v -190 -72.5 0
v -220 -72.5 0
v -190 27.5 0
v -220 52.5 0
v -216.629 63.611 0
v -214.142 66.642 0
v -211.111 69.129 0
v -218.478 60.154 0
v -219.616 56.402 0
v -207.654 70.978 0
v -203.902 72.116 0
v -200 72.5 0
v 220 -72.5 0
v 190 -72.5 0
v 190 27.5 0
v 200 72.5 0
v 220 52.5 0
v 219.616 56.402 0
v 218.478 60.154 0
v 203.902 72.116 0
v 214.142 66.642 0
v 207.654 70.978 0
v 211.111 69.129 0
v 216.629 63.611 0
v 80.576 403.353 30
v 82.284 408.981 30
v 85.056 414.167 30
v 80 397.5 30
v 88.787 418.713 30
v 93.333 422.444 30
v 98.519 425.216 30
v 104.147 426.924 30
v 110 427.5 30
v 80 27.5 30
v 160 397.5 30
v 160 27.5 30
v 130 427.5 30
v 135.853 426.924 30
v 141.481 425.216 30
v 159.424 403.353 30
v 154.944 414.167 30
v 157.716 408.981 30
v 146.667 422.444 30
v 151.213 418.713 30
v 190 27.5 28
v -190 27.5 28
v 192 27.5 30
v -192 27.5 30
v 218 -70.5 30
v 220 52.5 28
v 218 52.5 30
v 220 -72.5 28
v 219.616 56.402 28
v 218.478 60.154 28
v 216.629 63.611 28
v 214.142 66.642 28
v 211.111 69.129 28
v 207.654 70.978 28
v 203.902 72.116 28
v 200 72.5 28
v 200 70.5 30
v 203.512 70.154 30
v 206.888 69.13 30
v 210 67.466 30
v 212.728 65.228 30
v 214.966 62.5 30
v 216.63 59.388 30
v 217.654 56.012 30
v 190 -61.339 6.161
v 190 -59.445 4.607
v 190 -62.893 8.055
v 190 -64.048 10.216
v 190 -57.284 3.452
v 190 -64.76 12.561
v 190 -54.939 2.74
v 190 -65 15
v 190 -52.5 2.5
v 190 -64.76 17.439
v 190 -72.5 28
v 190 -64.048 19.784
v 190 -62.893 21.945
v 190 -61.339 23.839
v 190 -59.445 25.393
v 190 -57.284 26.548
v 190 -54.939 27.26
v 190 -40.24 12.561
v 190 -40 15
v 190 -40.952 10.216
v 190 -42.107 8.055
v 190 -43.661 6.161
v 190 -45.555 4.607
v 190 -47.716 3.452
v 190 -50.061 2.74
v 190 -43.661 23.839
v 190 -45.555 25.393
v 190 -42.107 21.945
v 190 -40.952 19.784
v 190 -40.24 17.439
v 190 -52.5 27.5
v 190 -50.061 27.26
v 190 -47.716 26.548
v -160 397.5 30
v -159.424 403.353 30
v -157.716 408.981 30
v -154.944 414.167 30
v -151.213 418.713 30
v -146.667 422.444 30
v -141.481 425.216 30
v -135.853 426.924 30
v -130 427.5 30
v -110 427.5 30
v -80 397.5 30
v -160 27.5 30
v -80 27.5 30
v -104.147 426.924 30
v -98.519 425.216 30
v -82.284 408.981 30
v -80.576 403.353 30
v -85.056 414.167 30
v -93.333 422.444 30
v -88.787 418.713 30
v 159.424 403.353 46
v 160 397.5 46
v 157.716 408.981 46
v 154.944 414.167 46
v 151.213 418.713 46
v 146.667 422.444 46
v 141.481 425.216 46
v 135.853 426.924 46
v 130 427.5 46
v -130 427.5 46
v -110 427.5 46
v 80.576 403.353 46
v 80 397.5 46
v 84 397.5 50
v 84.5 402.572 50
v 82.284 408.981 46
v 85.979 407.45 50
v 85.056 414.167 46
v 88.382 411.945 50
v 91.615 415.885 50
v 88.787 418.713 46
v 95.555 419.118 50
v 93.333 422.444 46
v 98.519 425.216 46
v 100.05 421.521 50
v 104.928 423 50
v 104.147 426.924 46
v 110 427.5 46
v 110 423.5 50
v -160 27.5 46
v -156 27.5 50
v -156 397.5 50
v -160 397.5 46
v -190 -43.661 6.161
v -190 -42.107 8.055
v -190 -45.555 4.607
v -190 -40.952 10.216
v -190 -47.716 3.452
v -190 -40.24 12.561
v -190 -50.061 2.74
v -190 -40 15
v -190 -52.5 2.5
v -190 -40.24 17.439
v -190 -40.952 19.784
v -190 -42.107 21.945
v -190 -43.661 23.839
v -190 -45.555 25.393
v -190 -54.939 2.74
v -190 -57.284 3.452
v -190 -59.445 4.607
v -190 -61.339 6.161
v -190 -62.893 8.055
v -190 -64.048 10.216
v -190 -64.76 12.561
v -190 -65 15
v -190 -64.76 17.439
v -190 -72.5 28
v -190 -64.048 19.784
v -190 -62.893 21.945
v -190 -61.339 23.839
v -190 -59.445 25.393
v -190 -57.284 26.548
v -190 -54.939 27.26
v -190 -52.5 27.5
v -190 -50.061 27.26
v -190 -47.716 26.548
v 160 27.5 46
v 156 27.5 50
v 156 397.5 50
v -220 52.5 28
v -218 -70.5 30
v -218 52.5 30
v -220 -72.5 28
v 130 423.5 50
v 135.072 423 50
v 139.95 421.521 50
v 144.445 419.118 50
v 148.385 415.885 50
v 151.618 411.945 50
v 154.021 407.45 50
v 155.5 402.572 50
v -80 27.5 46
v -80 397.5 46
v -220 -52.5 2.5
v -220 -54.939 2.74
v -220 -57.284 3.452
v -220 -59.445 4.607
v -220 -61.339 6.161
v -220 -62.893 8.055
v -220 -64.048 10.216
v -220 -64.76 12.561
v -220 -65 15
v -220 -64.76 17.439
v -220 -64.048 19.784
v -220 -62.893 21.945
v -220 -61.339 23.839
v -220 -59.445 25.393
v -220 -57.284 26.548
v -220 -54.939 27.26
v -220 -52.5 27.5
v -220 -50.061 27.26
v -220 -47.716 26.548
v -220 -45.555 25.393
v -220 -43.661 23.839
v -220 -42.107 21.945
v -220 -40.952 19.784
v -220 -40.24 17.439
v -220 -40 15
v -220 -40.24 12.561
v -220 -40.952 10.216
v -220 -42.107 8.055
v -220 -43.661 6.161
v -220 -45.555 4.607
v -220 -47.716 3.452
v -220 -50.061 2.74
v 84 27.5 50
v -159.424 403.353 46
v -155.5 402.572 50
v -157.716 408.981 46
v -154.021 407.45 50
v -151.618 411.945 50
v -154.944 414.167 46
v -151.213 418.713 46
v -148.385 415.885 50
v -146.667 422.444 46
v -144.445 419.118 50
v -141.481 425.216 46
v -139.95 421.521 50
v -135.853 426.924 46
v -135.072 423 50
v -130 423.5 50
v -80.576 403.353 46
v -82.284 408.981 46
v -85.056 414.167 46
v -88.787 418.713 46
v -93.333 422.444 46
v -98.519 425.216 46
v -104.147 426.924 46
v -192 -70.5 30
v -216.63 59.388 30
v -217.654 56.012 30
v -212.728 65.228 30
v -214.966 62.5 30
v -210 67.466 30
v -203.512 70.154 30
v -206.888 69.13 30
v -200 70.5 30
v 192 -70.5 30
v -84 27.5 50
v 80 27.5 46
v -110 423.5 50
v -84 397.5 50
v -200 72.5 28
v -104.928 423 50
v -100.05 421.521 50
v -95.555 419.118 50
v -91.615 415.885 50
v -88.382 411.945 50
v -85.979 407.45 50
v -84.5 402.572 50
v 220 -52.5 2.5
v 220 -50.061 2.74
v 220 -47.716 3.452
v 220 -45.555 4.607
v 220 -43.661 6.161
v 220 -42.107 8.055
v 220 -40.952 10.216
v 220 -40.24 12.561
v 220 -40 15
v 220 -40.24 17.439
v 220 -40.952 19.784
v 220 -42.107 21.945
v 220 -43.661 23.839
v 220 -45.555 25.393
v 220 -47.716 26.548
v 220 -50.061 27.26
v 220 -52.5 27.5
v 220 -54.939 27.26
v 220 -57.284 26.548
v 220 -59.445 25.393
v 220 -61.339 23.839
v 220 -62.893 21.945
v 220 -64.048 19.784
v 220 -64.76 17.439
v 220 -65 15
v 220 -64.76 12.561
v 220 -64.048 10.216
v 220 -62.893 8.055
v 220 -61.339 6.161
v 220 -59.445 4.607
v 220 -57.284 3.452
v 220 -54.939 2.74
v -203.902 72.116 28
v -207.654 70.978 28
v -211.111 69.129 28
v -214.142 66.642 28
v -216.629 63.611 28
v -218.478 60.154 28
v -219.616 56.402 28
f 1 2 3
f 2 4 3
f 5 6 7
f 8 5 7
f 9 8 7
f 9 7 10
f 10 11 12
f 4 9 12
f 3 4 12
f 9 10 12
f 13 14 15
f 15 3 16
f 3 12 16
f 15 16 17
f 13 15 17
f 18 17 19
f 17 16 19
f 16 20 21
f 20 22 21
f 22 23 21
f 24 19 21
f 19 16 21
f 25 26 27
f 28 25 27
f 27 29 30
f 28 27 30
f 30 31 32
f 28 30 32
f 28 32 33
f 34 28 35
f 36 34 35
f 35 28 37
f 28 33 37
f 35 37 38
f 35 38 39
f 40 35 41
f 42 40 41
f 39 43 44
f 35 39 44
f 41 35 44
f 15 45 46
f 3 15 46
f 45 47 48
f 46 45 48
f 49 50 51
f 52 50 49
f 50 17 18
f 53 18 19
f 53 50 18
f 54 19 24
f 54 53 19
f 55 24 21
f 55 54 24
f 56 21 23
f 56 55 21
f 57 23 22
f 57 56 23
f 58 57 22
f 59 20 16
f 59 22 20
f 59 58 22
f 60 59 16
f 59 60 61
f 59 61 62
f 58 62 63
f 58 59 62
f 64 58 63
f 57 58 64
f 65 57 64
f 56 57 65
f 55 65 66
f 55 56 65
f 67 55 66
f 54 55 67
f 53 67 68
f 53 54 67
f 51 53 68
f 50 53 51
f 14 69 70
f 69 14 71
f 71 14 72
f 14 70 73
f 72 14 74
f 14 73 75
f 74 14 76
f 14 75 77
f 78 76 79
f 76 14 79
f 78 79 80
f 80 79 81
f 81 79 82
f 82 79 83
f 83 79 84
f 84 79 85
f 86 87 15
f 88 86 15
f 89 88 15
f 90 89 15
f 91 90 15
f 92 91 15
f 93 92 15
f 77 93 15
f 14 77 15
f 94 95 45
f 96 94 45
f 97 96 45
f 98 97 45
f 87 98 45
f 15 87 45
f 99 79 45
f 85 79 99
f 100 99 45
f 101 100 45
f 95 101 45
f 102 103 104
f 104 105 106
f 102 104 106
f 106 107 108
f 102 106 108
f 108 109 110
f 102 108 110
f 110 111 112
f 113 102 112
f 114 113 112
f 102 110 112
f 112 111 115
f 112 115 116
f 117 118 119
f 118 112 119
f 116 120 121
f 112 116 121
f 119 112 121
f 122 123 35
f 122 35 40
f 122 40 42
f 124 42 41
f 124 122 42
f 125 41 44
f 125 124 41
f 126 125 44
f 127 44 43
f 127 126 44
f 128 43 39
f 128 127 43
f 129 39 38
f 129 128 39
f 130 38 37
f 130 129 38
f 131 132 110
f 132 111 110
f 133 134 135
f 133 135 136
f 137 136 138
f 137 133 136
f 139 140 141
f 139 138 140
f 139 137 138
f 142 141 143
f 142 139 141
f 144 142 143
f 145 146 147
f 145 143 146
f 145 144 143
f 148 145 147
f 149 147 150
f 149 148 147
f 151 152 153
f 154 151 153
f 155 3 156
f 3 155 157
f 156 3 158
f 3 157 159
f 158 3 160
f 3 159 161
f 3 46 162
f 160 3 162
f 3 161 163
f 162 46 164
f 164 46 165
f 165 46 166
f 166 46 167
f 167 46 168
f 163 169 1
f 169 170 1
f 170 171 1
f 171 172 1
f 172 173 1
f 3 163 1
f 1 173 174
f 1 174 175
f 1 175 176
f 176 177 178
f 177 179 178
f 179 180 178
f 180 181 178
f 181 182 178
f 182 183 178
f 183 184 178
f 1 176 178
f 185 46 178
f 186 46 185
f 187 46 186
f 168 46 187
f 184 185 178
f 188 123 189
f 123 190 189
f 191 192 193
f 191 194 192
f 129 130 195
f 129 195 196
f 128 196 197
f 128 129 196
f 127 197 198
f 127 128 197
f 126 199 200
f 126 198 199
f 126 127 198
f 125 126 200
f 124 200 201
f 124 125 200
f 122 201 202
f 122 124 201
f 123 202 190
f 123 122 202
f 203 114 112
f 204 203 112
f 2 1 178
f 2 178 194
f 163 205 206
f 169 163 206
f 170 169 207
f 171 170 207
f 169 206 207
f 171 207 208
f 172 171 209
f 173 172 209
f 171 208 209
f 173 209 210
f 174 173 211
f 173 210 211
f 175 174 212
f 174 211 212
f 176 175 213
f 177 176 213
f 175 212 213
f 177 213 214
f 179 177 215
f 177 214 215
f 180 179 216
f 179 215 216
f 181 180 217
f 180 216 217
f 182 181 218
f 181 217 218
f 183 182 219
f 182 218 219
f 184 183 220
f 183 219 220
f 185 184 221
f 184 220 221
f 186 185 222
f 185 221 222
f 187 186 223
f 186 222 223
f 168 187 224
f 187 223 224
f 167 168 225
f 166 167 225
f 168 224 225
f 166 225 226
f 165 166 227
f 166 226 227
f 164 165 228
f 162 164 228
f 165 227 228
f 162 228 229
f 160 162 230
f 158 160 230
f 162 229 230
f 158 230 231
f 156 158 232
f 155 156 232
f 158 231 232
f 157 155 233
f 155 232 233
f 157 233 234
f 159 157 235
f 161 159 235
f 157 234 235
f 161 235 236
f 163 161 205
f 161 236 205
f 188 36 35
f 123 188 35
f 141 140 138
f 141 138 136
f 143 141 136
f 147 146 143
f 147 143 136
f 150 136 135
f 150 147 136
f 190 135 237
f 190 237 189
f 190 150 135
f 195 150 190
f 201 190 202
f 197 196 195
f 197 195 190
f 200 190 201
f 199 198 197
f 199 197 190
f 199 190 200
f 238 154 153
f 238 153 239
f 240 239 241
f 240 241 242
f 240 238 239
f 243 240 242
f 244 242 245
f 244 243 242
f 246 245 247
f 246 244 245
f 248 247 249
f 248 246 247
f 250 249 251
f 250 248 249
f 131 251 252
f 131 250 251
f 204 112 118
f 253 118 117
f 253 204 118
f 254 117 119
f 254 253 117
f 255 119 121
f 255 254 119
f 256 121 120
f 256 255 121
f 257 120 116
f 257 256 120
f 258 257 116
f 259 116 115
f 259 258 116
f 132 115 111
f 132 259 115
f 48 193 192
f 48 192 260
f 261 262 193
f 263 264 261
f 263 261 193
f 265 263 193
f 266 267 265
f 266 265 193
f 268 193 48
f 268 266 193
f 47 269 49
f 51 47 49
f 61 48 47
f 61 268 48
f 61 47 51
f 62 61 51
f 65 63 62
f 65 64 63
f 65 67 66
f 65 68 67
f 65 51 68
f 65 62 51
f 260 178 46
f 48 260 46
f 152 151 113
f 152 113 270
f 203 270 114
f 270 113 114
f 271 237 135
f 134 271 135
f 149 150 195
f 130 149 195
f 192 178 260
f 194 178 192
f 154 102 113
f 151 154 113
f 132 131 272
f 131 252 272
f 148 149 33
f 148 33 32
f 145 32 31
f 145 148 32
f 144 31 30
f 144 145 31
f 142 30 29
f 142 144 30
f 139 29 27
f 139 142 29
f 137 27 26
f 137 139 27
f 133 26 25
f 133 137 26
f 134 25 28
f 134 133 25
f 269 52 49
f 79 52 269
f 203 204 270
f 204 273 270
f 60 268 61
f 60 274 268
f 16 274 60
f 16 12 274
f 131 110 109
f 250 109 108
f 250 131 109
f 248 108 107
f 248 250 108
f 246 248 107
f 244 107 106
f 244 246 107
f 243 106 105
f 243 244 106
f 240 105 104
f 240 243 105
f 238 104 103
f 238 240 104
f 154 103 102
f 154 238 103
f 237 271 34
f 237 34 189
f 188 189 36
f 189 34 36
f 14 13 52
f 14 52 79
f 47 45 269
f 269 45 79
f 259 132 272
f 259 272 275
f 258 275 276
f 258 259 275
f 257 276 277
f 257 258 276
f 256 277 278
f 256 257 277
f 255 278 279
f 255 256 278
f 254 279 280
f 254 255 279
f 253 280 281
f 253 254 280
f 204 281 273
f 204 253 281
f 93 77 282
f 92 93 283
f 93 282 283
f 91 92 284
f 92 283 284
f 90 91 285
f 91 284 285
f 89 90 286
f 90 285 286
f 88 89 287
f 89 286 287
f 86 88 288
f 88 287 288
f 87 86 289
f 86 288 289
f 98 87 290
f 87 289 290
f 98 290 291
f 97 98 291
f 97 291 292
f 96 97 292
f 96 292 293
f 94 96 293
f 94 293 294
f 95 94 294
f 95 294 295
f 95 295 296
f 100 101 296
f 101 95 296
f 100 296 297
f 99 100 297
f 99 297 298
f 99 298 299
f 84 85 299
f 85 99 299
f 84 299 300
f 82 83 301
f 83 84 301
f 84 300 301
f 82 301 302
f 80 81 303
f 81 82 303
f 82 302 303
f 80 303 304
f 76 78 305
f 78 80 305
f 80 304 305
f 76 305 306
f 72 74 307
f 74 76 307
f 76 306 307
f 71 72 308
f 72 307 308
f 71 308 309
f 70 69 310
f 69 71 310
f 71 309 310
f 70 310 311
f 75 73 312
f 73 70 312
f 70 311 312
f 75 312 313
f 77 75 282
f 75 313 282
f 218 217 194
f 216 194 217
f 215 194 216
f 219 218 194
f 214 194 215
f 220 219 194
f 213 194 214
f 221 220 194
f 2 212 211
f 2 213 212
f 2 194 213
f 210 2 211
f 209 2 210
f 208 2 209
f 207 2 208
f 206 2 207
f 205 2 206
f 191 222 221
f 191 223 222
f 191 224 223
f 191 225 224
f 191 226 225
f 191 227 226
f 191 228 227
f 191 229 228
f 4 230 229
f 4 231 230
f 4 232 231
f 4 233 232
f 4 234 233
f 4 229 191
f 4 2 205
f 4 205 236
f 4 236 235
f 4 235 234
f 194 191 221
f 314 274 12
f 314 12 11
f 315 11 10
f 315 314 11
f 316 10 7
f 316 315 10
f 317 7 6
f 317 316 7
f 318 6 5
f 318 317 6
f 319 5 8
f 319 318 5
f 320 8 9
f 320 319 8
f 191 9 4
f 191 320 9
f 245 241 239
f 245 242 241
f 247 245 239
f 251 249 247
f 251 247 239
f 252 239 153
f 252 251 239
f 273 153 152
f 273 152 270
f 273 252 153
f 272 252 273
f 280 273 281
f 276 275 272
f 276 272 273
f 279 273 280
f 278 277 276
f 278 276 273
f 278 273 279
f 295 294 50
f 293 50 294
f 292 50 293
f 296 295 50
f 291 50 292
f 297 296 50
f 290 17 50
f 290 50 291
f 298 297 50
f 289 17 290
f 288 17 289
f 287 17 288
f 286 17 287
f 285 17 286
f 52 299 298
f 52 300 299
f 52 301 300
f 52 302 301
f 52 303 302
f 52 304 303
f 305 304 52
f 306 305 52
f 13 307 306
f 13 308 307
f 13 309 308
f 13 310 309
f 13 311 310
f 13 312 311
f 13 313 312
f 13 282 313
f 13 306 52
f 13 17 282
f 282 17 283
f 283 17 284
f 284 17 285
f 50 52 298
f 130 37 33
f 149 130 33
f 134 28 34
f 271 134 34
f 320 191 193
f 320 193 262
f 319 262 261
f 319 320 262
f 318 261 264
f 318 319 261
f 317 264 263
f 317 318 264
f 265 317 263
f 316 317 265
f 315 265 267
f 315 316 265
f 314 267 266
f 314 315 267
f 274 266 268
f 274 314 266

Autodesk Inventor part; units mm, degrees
ref_plane "YZ Plane" through (0, 0, 0) normal (1, 0, 0) x (0, 1, 0)
ref_plane "XZ Plane" through (0, 0, 0) normal (0, 1, 0) x (-1, 0, 0)
ref_plane "XY Plane" through (0, 0, 0) normal (0, 0, 1) x (1, 0, 0)
sketch "Sketch1" plane through (0, 0, 0) normal (0, 0, 1) x (1, 0, 0)
  line L0 (-220, 72.5) -> (220, 72.5)
  line L1 (220, 72.5) -> (220, -72.5)
  line L2 (220, -72.5) -> (-220, -72.5)
  line L3 (-220, -72.5) -> (-220, 72.5)
  line L4 (-220, 72.5) -> (220, -72.5) construction
  line L5 (220, 72.5) -> (-220, -72.5) construction
  point P0 (0, 0)
  dimension "d0" = 440
  dimension "d1" = 145
extrude "Extrusion1" add sketch "Sketch1" along normal blind 30
sketch "Sketch2" plane through (0, 0, 30) normal (0, 0, 1) x (1, 0, 0)
  line L0 (-220, -72.5) -> (220, -72.5) projected
  line L1 (-190, -72.5) -> (190, -72.5)
  line L2 (190, -72.5) -> (190, 27.5)
  line L3 (190, 27.5) -> (-190, 27.5)
  line L4 (-190, 27.5) -> (-190, -72.5)
  line L5 (220, -72.5) -> (220, 72.5) projected
  line L6 (0, 72.5) -> (0, -72.5) construction
  line L7 (220, 72.5) -> (-220, 72.5) construction
  point P0 (0, 0)
  dimension "d4" = 30
  dimension "d5" = 45
extrude "Extrusion2" cut sketch "Sketch2" against normal blind 30
fillet "Fillet1" radius 20 2 edges at (220, 72.5, 15) (-220, 72.5, 15)
sketch "Sketch3" plane through (0, 0, 30) normal (0, 0, 1) x (1, 0, 0)
  line L0 (-190, 27.5) -> (190, 27.5) projected
  line L1 (-160, 27.5) -> (-80, 27.5)
  line L2 (-80, 27.5) -> (-80, 427.5)
  line L3 (-80, 427.5) -> (-160, 427.5)
  line L4 (-160, 427.5) -> (-160, 27.5)
  line L5 (-220, 52.5) -> (-220, -72.5) projected
  line L6 (-220, -72.5) -> (-190, -72.5) projected
  point P0 (0, 0)
  point P1 (-205, -72.5)
  dimension "d9" = 60
  dimension "d10" = 80
  dimension "d11" = 500
extrude "Extrusion3" add sketch "Sketch3" along normal blind 20 separate body
fillet "Fillet2" radius 30 2 edges at (-160, 427.5, 40) (-80, 427.5, 40)
chamfer "Chamfer1" distance 4 angle 45 5 edges at (-151.2132, 418.7132, 50) (-120, 427.5, 50) (-88.7868, 418.7132, 50) (-80, 212.5, 50) (-160, 212.5, 50)
mirror "Mirror1" about plane through (0, 0, 0) normal (1, 0, 0) of "Extrusion3", "Fillet2", "Chamfer1" bodies 2
chamfer "Chamfer2" distance 2 angle 45 9 edges at (-190, -22.5, 30) (-205, -72.5, 30) (-220, -10, 30) (-214.1421, 66.6421, 30) (0, 72.5, 30) (214.1421, 66.6421, 30) (220, -10, 30) (190, -22.5, 30) (205, -72.5, 30)
sketch "Sketch4" plane through (-190, -72.5, 0) normal (1, 0, 0) x (0, 0, -1)
  line L0 (0, 0) -> (-28, 0) construction
  line L1 (0, 100) -> (0, 0) construction
  point P0 (0, 72.5)
  point P1 (-15, 20)
  point P2 (-14, 0)
  dimension "d21" = 20
  dimension "d22" = 15
hole "Hole1" at (-190, -52.5, 15) direction (-1, 0, 0) diameter 25 end through all bodies 1
mirror "Mirror2" about plane through (0, 0, 0) normal (1, 0, 0) of "Hole1" bodies 1
properties part number "Fork" material "Iron, Ductile"
